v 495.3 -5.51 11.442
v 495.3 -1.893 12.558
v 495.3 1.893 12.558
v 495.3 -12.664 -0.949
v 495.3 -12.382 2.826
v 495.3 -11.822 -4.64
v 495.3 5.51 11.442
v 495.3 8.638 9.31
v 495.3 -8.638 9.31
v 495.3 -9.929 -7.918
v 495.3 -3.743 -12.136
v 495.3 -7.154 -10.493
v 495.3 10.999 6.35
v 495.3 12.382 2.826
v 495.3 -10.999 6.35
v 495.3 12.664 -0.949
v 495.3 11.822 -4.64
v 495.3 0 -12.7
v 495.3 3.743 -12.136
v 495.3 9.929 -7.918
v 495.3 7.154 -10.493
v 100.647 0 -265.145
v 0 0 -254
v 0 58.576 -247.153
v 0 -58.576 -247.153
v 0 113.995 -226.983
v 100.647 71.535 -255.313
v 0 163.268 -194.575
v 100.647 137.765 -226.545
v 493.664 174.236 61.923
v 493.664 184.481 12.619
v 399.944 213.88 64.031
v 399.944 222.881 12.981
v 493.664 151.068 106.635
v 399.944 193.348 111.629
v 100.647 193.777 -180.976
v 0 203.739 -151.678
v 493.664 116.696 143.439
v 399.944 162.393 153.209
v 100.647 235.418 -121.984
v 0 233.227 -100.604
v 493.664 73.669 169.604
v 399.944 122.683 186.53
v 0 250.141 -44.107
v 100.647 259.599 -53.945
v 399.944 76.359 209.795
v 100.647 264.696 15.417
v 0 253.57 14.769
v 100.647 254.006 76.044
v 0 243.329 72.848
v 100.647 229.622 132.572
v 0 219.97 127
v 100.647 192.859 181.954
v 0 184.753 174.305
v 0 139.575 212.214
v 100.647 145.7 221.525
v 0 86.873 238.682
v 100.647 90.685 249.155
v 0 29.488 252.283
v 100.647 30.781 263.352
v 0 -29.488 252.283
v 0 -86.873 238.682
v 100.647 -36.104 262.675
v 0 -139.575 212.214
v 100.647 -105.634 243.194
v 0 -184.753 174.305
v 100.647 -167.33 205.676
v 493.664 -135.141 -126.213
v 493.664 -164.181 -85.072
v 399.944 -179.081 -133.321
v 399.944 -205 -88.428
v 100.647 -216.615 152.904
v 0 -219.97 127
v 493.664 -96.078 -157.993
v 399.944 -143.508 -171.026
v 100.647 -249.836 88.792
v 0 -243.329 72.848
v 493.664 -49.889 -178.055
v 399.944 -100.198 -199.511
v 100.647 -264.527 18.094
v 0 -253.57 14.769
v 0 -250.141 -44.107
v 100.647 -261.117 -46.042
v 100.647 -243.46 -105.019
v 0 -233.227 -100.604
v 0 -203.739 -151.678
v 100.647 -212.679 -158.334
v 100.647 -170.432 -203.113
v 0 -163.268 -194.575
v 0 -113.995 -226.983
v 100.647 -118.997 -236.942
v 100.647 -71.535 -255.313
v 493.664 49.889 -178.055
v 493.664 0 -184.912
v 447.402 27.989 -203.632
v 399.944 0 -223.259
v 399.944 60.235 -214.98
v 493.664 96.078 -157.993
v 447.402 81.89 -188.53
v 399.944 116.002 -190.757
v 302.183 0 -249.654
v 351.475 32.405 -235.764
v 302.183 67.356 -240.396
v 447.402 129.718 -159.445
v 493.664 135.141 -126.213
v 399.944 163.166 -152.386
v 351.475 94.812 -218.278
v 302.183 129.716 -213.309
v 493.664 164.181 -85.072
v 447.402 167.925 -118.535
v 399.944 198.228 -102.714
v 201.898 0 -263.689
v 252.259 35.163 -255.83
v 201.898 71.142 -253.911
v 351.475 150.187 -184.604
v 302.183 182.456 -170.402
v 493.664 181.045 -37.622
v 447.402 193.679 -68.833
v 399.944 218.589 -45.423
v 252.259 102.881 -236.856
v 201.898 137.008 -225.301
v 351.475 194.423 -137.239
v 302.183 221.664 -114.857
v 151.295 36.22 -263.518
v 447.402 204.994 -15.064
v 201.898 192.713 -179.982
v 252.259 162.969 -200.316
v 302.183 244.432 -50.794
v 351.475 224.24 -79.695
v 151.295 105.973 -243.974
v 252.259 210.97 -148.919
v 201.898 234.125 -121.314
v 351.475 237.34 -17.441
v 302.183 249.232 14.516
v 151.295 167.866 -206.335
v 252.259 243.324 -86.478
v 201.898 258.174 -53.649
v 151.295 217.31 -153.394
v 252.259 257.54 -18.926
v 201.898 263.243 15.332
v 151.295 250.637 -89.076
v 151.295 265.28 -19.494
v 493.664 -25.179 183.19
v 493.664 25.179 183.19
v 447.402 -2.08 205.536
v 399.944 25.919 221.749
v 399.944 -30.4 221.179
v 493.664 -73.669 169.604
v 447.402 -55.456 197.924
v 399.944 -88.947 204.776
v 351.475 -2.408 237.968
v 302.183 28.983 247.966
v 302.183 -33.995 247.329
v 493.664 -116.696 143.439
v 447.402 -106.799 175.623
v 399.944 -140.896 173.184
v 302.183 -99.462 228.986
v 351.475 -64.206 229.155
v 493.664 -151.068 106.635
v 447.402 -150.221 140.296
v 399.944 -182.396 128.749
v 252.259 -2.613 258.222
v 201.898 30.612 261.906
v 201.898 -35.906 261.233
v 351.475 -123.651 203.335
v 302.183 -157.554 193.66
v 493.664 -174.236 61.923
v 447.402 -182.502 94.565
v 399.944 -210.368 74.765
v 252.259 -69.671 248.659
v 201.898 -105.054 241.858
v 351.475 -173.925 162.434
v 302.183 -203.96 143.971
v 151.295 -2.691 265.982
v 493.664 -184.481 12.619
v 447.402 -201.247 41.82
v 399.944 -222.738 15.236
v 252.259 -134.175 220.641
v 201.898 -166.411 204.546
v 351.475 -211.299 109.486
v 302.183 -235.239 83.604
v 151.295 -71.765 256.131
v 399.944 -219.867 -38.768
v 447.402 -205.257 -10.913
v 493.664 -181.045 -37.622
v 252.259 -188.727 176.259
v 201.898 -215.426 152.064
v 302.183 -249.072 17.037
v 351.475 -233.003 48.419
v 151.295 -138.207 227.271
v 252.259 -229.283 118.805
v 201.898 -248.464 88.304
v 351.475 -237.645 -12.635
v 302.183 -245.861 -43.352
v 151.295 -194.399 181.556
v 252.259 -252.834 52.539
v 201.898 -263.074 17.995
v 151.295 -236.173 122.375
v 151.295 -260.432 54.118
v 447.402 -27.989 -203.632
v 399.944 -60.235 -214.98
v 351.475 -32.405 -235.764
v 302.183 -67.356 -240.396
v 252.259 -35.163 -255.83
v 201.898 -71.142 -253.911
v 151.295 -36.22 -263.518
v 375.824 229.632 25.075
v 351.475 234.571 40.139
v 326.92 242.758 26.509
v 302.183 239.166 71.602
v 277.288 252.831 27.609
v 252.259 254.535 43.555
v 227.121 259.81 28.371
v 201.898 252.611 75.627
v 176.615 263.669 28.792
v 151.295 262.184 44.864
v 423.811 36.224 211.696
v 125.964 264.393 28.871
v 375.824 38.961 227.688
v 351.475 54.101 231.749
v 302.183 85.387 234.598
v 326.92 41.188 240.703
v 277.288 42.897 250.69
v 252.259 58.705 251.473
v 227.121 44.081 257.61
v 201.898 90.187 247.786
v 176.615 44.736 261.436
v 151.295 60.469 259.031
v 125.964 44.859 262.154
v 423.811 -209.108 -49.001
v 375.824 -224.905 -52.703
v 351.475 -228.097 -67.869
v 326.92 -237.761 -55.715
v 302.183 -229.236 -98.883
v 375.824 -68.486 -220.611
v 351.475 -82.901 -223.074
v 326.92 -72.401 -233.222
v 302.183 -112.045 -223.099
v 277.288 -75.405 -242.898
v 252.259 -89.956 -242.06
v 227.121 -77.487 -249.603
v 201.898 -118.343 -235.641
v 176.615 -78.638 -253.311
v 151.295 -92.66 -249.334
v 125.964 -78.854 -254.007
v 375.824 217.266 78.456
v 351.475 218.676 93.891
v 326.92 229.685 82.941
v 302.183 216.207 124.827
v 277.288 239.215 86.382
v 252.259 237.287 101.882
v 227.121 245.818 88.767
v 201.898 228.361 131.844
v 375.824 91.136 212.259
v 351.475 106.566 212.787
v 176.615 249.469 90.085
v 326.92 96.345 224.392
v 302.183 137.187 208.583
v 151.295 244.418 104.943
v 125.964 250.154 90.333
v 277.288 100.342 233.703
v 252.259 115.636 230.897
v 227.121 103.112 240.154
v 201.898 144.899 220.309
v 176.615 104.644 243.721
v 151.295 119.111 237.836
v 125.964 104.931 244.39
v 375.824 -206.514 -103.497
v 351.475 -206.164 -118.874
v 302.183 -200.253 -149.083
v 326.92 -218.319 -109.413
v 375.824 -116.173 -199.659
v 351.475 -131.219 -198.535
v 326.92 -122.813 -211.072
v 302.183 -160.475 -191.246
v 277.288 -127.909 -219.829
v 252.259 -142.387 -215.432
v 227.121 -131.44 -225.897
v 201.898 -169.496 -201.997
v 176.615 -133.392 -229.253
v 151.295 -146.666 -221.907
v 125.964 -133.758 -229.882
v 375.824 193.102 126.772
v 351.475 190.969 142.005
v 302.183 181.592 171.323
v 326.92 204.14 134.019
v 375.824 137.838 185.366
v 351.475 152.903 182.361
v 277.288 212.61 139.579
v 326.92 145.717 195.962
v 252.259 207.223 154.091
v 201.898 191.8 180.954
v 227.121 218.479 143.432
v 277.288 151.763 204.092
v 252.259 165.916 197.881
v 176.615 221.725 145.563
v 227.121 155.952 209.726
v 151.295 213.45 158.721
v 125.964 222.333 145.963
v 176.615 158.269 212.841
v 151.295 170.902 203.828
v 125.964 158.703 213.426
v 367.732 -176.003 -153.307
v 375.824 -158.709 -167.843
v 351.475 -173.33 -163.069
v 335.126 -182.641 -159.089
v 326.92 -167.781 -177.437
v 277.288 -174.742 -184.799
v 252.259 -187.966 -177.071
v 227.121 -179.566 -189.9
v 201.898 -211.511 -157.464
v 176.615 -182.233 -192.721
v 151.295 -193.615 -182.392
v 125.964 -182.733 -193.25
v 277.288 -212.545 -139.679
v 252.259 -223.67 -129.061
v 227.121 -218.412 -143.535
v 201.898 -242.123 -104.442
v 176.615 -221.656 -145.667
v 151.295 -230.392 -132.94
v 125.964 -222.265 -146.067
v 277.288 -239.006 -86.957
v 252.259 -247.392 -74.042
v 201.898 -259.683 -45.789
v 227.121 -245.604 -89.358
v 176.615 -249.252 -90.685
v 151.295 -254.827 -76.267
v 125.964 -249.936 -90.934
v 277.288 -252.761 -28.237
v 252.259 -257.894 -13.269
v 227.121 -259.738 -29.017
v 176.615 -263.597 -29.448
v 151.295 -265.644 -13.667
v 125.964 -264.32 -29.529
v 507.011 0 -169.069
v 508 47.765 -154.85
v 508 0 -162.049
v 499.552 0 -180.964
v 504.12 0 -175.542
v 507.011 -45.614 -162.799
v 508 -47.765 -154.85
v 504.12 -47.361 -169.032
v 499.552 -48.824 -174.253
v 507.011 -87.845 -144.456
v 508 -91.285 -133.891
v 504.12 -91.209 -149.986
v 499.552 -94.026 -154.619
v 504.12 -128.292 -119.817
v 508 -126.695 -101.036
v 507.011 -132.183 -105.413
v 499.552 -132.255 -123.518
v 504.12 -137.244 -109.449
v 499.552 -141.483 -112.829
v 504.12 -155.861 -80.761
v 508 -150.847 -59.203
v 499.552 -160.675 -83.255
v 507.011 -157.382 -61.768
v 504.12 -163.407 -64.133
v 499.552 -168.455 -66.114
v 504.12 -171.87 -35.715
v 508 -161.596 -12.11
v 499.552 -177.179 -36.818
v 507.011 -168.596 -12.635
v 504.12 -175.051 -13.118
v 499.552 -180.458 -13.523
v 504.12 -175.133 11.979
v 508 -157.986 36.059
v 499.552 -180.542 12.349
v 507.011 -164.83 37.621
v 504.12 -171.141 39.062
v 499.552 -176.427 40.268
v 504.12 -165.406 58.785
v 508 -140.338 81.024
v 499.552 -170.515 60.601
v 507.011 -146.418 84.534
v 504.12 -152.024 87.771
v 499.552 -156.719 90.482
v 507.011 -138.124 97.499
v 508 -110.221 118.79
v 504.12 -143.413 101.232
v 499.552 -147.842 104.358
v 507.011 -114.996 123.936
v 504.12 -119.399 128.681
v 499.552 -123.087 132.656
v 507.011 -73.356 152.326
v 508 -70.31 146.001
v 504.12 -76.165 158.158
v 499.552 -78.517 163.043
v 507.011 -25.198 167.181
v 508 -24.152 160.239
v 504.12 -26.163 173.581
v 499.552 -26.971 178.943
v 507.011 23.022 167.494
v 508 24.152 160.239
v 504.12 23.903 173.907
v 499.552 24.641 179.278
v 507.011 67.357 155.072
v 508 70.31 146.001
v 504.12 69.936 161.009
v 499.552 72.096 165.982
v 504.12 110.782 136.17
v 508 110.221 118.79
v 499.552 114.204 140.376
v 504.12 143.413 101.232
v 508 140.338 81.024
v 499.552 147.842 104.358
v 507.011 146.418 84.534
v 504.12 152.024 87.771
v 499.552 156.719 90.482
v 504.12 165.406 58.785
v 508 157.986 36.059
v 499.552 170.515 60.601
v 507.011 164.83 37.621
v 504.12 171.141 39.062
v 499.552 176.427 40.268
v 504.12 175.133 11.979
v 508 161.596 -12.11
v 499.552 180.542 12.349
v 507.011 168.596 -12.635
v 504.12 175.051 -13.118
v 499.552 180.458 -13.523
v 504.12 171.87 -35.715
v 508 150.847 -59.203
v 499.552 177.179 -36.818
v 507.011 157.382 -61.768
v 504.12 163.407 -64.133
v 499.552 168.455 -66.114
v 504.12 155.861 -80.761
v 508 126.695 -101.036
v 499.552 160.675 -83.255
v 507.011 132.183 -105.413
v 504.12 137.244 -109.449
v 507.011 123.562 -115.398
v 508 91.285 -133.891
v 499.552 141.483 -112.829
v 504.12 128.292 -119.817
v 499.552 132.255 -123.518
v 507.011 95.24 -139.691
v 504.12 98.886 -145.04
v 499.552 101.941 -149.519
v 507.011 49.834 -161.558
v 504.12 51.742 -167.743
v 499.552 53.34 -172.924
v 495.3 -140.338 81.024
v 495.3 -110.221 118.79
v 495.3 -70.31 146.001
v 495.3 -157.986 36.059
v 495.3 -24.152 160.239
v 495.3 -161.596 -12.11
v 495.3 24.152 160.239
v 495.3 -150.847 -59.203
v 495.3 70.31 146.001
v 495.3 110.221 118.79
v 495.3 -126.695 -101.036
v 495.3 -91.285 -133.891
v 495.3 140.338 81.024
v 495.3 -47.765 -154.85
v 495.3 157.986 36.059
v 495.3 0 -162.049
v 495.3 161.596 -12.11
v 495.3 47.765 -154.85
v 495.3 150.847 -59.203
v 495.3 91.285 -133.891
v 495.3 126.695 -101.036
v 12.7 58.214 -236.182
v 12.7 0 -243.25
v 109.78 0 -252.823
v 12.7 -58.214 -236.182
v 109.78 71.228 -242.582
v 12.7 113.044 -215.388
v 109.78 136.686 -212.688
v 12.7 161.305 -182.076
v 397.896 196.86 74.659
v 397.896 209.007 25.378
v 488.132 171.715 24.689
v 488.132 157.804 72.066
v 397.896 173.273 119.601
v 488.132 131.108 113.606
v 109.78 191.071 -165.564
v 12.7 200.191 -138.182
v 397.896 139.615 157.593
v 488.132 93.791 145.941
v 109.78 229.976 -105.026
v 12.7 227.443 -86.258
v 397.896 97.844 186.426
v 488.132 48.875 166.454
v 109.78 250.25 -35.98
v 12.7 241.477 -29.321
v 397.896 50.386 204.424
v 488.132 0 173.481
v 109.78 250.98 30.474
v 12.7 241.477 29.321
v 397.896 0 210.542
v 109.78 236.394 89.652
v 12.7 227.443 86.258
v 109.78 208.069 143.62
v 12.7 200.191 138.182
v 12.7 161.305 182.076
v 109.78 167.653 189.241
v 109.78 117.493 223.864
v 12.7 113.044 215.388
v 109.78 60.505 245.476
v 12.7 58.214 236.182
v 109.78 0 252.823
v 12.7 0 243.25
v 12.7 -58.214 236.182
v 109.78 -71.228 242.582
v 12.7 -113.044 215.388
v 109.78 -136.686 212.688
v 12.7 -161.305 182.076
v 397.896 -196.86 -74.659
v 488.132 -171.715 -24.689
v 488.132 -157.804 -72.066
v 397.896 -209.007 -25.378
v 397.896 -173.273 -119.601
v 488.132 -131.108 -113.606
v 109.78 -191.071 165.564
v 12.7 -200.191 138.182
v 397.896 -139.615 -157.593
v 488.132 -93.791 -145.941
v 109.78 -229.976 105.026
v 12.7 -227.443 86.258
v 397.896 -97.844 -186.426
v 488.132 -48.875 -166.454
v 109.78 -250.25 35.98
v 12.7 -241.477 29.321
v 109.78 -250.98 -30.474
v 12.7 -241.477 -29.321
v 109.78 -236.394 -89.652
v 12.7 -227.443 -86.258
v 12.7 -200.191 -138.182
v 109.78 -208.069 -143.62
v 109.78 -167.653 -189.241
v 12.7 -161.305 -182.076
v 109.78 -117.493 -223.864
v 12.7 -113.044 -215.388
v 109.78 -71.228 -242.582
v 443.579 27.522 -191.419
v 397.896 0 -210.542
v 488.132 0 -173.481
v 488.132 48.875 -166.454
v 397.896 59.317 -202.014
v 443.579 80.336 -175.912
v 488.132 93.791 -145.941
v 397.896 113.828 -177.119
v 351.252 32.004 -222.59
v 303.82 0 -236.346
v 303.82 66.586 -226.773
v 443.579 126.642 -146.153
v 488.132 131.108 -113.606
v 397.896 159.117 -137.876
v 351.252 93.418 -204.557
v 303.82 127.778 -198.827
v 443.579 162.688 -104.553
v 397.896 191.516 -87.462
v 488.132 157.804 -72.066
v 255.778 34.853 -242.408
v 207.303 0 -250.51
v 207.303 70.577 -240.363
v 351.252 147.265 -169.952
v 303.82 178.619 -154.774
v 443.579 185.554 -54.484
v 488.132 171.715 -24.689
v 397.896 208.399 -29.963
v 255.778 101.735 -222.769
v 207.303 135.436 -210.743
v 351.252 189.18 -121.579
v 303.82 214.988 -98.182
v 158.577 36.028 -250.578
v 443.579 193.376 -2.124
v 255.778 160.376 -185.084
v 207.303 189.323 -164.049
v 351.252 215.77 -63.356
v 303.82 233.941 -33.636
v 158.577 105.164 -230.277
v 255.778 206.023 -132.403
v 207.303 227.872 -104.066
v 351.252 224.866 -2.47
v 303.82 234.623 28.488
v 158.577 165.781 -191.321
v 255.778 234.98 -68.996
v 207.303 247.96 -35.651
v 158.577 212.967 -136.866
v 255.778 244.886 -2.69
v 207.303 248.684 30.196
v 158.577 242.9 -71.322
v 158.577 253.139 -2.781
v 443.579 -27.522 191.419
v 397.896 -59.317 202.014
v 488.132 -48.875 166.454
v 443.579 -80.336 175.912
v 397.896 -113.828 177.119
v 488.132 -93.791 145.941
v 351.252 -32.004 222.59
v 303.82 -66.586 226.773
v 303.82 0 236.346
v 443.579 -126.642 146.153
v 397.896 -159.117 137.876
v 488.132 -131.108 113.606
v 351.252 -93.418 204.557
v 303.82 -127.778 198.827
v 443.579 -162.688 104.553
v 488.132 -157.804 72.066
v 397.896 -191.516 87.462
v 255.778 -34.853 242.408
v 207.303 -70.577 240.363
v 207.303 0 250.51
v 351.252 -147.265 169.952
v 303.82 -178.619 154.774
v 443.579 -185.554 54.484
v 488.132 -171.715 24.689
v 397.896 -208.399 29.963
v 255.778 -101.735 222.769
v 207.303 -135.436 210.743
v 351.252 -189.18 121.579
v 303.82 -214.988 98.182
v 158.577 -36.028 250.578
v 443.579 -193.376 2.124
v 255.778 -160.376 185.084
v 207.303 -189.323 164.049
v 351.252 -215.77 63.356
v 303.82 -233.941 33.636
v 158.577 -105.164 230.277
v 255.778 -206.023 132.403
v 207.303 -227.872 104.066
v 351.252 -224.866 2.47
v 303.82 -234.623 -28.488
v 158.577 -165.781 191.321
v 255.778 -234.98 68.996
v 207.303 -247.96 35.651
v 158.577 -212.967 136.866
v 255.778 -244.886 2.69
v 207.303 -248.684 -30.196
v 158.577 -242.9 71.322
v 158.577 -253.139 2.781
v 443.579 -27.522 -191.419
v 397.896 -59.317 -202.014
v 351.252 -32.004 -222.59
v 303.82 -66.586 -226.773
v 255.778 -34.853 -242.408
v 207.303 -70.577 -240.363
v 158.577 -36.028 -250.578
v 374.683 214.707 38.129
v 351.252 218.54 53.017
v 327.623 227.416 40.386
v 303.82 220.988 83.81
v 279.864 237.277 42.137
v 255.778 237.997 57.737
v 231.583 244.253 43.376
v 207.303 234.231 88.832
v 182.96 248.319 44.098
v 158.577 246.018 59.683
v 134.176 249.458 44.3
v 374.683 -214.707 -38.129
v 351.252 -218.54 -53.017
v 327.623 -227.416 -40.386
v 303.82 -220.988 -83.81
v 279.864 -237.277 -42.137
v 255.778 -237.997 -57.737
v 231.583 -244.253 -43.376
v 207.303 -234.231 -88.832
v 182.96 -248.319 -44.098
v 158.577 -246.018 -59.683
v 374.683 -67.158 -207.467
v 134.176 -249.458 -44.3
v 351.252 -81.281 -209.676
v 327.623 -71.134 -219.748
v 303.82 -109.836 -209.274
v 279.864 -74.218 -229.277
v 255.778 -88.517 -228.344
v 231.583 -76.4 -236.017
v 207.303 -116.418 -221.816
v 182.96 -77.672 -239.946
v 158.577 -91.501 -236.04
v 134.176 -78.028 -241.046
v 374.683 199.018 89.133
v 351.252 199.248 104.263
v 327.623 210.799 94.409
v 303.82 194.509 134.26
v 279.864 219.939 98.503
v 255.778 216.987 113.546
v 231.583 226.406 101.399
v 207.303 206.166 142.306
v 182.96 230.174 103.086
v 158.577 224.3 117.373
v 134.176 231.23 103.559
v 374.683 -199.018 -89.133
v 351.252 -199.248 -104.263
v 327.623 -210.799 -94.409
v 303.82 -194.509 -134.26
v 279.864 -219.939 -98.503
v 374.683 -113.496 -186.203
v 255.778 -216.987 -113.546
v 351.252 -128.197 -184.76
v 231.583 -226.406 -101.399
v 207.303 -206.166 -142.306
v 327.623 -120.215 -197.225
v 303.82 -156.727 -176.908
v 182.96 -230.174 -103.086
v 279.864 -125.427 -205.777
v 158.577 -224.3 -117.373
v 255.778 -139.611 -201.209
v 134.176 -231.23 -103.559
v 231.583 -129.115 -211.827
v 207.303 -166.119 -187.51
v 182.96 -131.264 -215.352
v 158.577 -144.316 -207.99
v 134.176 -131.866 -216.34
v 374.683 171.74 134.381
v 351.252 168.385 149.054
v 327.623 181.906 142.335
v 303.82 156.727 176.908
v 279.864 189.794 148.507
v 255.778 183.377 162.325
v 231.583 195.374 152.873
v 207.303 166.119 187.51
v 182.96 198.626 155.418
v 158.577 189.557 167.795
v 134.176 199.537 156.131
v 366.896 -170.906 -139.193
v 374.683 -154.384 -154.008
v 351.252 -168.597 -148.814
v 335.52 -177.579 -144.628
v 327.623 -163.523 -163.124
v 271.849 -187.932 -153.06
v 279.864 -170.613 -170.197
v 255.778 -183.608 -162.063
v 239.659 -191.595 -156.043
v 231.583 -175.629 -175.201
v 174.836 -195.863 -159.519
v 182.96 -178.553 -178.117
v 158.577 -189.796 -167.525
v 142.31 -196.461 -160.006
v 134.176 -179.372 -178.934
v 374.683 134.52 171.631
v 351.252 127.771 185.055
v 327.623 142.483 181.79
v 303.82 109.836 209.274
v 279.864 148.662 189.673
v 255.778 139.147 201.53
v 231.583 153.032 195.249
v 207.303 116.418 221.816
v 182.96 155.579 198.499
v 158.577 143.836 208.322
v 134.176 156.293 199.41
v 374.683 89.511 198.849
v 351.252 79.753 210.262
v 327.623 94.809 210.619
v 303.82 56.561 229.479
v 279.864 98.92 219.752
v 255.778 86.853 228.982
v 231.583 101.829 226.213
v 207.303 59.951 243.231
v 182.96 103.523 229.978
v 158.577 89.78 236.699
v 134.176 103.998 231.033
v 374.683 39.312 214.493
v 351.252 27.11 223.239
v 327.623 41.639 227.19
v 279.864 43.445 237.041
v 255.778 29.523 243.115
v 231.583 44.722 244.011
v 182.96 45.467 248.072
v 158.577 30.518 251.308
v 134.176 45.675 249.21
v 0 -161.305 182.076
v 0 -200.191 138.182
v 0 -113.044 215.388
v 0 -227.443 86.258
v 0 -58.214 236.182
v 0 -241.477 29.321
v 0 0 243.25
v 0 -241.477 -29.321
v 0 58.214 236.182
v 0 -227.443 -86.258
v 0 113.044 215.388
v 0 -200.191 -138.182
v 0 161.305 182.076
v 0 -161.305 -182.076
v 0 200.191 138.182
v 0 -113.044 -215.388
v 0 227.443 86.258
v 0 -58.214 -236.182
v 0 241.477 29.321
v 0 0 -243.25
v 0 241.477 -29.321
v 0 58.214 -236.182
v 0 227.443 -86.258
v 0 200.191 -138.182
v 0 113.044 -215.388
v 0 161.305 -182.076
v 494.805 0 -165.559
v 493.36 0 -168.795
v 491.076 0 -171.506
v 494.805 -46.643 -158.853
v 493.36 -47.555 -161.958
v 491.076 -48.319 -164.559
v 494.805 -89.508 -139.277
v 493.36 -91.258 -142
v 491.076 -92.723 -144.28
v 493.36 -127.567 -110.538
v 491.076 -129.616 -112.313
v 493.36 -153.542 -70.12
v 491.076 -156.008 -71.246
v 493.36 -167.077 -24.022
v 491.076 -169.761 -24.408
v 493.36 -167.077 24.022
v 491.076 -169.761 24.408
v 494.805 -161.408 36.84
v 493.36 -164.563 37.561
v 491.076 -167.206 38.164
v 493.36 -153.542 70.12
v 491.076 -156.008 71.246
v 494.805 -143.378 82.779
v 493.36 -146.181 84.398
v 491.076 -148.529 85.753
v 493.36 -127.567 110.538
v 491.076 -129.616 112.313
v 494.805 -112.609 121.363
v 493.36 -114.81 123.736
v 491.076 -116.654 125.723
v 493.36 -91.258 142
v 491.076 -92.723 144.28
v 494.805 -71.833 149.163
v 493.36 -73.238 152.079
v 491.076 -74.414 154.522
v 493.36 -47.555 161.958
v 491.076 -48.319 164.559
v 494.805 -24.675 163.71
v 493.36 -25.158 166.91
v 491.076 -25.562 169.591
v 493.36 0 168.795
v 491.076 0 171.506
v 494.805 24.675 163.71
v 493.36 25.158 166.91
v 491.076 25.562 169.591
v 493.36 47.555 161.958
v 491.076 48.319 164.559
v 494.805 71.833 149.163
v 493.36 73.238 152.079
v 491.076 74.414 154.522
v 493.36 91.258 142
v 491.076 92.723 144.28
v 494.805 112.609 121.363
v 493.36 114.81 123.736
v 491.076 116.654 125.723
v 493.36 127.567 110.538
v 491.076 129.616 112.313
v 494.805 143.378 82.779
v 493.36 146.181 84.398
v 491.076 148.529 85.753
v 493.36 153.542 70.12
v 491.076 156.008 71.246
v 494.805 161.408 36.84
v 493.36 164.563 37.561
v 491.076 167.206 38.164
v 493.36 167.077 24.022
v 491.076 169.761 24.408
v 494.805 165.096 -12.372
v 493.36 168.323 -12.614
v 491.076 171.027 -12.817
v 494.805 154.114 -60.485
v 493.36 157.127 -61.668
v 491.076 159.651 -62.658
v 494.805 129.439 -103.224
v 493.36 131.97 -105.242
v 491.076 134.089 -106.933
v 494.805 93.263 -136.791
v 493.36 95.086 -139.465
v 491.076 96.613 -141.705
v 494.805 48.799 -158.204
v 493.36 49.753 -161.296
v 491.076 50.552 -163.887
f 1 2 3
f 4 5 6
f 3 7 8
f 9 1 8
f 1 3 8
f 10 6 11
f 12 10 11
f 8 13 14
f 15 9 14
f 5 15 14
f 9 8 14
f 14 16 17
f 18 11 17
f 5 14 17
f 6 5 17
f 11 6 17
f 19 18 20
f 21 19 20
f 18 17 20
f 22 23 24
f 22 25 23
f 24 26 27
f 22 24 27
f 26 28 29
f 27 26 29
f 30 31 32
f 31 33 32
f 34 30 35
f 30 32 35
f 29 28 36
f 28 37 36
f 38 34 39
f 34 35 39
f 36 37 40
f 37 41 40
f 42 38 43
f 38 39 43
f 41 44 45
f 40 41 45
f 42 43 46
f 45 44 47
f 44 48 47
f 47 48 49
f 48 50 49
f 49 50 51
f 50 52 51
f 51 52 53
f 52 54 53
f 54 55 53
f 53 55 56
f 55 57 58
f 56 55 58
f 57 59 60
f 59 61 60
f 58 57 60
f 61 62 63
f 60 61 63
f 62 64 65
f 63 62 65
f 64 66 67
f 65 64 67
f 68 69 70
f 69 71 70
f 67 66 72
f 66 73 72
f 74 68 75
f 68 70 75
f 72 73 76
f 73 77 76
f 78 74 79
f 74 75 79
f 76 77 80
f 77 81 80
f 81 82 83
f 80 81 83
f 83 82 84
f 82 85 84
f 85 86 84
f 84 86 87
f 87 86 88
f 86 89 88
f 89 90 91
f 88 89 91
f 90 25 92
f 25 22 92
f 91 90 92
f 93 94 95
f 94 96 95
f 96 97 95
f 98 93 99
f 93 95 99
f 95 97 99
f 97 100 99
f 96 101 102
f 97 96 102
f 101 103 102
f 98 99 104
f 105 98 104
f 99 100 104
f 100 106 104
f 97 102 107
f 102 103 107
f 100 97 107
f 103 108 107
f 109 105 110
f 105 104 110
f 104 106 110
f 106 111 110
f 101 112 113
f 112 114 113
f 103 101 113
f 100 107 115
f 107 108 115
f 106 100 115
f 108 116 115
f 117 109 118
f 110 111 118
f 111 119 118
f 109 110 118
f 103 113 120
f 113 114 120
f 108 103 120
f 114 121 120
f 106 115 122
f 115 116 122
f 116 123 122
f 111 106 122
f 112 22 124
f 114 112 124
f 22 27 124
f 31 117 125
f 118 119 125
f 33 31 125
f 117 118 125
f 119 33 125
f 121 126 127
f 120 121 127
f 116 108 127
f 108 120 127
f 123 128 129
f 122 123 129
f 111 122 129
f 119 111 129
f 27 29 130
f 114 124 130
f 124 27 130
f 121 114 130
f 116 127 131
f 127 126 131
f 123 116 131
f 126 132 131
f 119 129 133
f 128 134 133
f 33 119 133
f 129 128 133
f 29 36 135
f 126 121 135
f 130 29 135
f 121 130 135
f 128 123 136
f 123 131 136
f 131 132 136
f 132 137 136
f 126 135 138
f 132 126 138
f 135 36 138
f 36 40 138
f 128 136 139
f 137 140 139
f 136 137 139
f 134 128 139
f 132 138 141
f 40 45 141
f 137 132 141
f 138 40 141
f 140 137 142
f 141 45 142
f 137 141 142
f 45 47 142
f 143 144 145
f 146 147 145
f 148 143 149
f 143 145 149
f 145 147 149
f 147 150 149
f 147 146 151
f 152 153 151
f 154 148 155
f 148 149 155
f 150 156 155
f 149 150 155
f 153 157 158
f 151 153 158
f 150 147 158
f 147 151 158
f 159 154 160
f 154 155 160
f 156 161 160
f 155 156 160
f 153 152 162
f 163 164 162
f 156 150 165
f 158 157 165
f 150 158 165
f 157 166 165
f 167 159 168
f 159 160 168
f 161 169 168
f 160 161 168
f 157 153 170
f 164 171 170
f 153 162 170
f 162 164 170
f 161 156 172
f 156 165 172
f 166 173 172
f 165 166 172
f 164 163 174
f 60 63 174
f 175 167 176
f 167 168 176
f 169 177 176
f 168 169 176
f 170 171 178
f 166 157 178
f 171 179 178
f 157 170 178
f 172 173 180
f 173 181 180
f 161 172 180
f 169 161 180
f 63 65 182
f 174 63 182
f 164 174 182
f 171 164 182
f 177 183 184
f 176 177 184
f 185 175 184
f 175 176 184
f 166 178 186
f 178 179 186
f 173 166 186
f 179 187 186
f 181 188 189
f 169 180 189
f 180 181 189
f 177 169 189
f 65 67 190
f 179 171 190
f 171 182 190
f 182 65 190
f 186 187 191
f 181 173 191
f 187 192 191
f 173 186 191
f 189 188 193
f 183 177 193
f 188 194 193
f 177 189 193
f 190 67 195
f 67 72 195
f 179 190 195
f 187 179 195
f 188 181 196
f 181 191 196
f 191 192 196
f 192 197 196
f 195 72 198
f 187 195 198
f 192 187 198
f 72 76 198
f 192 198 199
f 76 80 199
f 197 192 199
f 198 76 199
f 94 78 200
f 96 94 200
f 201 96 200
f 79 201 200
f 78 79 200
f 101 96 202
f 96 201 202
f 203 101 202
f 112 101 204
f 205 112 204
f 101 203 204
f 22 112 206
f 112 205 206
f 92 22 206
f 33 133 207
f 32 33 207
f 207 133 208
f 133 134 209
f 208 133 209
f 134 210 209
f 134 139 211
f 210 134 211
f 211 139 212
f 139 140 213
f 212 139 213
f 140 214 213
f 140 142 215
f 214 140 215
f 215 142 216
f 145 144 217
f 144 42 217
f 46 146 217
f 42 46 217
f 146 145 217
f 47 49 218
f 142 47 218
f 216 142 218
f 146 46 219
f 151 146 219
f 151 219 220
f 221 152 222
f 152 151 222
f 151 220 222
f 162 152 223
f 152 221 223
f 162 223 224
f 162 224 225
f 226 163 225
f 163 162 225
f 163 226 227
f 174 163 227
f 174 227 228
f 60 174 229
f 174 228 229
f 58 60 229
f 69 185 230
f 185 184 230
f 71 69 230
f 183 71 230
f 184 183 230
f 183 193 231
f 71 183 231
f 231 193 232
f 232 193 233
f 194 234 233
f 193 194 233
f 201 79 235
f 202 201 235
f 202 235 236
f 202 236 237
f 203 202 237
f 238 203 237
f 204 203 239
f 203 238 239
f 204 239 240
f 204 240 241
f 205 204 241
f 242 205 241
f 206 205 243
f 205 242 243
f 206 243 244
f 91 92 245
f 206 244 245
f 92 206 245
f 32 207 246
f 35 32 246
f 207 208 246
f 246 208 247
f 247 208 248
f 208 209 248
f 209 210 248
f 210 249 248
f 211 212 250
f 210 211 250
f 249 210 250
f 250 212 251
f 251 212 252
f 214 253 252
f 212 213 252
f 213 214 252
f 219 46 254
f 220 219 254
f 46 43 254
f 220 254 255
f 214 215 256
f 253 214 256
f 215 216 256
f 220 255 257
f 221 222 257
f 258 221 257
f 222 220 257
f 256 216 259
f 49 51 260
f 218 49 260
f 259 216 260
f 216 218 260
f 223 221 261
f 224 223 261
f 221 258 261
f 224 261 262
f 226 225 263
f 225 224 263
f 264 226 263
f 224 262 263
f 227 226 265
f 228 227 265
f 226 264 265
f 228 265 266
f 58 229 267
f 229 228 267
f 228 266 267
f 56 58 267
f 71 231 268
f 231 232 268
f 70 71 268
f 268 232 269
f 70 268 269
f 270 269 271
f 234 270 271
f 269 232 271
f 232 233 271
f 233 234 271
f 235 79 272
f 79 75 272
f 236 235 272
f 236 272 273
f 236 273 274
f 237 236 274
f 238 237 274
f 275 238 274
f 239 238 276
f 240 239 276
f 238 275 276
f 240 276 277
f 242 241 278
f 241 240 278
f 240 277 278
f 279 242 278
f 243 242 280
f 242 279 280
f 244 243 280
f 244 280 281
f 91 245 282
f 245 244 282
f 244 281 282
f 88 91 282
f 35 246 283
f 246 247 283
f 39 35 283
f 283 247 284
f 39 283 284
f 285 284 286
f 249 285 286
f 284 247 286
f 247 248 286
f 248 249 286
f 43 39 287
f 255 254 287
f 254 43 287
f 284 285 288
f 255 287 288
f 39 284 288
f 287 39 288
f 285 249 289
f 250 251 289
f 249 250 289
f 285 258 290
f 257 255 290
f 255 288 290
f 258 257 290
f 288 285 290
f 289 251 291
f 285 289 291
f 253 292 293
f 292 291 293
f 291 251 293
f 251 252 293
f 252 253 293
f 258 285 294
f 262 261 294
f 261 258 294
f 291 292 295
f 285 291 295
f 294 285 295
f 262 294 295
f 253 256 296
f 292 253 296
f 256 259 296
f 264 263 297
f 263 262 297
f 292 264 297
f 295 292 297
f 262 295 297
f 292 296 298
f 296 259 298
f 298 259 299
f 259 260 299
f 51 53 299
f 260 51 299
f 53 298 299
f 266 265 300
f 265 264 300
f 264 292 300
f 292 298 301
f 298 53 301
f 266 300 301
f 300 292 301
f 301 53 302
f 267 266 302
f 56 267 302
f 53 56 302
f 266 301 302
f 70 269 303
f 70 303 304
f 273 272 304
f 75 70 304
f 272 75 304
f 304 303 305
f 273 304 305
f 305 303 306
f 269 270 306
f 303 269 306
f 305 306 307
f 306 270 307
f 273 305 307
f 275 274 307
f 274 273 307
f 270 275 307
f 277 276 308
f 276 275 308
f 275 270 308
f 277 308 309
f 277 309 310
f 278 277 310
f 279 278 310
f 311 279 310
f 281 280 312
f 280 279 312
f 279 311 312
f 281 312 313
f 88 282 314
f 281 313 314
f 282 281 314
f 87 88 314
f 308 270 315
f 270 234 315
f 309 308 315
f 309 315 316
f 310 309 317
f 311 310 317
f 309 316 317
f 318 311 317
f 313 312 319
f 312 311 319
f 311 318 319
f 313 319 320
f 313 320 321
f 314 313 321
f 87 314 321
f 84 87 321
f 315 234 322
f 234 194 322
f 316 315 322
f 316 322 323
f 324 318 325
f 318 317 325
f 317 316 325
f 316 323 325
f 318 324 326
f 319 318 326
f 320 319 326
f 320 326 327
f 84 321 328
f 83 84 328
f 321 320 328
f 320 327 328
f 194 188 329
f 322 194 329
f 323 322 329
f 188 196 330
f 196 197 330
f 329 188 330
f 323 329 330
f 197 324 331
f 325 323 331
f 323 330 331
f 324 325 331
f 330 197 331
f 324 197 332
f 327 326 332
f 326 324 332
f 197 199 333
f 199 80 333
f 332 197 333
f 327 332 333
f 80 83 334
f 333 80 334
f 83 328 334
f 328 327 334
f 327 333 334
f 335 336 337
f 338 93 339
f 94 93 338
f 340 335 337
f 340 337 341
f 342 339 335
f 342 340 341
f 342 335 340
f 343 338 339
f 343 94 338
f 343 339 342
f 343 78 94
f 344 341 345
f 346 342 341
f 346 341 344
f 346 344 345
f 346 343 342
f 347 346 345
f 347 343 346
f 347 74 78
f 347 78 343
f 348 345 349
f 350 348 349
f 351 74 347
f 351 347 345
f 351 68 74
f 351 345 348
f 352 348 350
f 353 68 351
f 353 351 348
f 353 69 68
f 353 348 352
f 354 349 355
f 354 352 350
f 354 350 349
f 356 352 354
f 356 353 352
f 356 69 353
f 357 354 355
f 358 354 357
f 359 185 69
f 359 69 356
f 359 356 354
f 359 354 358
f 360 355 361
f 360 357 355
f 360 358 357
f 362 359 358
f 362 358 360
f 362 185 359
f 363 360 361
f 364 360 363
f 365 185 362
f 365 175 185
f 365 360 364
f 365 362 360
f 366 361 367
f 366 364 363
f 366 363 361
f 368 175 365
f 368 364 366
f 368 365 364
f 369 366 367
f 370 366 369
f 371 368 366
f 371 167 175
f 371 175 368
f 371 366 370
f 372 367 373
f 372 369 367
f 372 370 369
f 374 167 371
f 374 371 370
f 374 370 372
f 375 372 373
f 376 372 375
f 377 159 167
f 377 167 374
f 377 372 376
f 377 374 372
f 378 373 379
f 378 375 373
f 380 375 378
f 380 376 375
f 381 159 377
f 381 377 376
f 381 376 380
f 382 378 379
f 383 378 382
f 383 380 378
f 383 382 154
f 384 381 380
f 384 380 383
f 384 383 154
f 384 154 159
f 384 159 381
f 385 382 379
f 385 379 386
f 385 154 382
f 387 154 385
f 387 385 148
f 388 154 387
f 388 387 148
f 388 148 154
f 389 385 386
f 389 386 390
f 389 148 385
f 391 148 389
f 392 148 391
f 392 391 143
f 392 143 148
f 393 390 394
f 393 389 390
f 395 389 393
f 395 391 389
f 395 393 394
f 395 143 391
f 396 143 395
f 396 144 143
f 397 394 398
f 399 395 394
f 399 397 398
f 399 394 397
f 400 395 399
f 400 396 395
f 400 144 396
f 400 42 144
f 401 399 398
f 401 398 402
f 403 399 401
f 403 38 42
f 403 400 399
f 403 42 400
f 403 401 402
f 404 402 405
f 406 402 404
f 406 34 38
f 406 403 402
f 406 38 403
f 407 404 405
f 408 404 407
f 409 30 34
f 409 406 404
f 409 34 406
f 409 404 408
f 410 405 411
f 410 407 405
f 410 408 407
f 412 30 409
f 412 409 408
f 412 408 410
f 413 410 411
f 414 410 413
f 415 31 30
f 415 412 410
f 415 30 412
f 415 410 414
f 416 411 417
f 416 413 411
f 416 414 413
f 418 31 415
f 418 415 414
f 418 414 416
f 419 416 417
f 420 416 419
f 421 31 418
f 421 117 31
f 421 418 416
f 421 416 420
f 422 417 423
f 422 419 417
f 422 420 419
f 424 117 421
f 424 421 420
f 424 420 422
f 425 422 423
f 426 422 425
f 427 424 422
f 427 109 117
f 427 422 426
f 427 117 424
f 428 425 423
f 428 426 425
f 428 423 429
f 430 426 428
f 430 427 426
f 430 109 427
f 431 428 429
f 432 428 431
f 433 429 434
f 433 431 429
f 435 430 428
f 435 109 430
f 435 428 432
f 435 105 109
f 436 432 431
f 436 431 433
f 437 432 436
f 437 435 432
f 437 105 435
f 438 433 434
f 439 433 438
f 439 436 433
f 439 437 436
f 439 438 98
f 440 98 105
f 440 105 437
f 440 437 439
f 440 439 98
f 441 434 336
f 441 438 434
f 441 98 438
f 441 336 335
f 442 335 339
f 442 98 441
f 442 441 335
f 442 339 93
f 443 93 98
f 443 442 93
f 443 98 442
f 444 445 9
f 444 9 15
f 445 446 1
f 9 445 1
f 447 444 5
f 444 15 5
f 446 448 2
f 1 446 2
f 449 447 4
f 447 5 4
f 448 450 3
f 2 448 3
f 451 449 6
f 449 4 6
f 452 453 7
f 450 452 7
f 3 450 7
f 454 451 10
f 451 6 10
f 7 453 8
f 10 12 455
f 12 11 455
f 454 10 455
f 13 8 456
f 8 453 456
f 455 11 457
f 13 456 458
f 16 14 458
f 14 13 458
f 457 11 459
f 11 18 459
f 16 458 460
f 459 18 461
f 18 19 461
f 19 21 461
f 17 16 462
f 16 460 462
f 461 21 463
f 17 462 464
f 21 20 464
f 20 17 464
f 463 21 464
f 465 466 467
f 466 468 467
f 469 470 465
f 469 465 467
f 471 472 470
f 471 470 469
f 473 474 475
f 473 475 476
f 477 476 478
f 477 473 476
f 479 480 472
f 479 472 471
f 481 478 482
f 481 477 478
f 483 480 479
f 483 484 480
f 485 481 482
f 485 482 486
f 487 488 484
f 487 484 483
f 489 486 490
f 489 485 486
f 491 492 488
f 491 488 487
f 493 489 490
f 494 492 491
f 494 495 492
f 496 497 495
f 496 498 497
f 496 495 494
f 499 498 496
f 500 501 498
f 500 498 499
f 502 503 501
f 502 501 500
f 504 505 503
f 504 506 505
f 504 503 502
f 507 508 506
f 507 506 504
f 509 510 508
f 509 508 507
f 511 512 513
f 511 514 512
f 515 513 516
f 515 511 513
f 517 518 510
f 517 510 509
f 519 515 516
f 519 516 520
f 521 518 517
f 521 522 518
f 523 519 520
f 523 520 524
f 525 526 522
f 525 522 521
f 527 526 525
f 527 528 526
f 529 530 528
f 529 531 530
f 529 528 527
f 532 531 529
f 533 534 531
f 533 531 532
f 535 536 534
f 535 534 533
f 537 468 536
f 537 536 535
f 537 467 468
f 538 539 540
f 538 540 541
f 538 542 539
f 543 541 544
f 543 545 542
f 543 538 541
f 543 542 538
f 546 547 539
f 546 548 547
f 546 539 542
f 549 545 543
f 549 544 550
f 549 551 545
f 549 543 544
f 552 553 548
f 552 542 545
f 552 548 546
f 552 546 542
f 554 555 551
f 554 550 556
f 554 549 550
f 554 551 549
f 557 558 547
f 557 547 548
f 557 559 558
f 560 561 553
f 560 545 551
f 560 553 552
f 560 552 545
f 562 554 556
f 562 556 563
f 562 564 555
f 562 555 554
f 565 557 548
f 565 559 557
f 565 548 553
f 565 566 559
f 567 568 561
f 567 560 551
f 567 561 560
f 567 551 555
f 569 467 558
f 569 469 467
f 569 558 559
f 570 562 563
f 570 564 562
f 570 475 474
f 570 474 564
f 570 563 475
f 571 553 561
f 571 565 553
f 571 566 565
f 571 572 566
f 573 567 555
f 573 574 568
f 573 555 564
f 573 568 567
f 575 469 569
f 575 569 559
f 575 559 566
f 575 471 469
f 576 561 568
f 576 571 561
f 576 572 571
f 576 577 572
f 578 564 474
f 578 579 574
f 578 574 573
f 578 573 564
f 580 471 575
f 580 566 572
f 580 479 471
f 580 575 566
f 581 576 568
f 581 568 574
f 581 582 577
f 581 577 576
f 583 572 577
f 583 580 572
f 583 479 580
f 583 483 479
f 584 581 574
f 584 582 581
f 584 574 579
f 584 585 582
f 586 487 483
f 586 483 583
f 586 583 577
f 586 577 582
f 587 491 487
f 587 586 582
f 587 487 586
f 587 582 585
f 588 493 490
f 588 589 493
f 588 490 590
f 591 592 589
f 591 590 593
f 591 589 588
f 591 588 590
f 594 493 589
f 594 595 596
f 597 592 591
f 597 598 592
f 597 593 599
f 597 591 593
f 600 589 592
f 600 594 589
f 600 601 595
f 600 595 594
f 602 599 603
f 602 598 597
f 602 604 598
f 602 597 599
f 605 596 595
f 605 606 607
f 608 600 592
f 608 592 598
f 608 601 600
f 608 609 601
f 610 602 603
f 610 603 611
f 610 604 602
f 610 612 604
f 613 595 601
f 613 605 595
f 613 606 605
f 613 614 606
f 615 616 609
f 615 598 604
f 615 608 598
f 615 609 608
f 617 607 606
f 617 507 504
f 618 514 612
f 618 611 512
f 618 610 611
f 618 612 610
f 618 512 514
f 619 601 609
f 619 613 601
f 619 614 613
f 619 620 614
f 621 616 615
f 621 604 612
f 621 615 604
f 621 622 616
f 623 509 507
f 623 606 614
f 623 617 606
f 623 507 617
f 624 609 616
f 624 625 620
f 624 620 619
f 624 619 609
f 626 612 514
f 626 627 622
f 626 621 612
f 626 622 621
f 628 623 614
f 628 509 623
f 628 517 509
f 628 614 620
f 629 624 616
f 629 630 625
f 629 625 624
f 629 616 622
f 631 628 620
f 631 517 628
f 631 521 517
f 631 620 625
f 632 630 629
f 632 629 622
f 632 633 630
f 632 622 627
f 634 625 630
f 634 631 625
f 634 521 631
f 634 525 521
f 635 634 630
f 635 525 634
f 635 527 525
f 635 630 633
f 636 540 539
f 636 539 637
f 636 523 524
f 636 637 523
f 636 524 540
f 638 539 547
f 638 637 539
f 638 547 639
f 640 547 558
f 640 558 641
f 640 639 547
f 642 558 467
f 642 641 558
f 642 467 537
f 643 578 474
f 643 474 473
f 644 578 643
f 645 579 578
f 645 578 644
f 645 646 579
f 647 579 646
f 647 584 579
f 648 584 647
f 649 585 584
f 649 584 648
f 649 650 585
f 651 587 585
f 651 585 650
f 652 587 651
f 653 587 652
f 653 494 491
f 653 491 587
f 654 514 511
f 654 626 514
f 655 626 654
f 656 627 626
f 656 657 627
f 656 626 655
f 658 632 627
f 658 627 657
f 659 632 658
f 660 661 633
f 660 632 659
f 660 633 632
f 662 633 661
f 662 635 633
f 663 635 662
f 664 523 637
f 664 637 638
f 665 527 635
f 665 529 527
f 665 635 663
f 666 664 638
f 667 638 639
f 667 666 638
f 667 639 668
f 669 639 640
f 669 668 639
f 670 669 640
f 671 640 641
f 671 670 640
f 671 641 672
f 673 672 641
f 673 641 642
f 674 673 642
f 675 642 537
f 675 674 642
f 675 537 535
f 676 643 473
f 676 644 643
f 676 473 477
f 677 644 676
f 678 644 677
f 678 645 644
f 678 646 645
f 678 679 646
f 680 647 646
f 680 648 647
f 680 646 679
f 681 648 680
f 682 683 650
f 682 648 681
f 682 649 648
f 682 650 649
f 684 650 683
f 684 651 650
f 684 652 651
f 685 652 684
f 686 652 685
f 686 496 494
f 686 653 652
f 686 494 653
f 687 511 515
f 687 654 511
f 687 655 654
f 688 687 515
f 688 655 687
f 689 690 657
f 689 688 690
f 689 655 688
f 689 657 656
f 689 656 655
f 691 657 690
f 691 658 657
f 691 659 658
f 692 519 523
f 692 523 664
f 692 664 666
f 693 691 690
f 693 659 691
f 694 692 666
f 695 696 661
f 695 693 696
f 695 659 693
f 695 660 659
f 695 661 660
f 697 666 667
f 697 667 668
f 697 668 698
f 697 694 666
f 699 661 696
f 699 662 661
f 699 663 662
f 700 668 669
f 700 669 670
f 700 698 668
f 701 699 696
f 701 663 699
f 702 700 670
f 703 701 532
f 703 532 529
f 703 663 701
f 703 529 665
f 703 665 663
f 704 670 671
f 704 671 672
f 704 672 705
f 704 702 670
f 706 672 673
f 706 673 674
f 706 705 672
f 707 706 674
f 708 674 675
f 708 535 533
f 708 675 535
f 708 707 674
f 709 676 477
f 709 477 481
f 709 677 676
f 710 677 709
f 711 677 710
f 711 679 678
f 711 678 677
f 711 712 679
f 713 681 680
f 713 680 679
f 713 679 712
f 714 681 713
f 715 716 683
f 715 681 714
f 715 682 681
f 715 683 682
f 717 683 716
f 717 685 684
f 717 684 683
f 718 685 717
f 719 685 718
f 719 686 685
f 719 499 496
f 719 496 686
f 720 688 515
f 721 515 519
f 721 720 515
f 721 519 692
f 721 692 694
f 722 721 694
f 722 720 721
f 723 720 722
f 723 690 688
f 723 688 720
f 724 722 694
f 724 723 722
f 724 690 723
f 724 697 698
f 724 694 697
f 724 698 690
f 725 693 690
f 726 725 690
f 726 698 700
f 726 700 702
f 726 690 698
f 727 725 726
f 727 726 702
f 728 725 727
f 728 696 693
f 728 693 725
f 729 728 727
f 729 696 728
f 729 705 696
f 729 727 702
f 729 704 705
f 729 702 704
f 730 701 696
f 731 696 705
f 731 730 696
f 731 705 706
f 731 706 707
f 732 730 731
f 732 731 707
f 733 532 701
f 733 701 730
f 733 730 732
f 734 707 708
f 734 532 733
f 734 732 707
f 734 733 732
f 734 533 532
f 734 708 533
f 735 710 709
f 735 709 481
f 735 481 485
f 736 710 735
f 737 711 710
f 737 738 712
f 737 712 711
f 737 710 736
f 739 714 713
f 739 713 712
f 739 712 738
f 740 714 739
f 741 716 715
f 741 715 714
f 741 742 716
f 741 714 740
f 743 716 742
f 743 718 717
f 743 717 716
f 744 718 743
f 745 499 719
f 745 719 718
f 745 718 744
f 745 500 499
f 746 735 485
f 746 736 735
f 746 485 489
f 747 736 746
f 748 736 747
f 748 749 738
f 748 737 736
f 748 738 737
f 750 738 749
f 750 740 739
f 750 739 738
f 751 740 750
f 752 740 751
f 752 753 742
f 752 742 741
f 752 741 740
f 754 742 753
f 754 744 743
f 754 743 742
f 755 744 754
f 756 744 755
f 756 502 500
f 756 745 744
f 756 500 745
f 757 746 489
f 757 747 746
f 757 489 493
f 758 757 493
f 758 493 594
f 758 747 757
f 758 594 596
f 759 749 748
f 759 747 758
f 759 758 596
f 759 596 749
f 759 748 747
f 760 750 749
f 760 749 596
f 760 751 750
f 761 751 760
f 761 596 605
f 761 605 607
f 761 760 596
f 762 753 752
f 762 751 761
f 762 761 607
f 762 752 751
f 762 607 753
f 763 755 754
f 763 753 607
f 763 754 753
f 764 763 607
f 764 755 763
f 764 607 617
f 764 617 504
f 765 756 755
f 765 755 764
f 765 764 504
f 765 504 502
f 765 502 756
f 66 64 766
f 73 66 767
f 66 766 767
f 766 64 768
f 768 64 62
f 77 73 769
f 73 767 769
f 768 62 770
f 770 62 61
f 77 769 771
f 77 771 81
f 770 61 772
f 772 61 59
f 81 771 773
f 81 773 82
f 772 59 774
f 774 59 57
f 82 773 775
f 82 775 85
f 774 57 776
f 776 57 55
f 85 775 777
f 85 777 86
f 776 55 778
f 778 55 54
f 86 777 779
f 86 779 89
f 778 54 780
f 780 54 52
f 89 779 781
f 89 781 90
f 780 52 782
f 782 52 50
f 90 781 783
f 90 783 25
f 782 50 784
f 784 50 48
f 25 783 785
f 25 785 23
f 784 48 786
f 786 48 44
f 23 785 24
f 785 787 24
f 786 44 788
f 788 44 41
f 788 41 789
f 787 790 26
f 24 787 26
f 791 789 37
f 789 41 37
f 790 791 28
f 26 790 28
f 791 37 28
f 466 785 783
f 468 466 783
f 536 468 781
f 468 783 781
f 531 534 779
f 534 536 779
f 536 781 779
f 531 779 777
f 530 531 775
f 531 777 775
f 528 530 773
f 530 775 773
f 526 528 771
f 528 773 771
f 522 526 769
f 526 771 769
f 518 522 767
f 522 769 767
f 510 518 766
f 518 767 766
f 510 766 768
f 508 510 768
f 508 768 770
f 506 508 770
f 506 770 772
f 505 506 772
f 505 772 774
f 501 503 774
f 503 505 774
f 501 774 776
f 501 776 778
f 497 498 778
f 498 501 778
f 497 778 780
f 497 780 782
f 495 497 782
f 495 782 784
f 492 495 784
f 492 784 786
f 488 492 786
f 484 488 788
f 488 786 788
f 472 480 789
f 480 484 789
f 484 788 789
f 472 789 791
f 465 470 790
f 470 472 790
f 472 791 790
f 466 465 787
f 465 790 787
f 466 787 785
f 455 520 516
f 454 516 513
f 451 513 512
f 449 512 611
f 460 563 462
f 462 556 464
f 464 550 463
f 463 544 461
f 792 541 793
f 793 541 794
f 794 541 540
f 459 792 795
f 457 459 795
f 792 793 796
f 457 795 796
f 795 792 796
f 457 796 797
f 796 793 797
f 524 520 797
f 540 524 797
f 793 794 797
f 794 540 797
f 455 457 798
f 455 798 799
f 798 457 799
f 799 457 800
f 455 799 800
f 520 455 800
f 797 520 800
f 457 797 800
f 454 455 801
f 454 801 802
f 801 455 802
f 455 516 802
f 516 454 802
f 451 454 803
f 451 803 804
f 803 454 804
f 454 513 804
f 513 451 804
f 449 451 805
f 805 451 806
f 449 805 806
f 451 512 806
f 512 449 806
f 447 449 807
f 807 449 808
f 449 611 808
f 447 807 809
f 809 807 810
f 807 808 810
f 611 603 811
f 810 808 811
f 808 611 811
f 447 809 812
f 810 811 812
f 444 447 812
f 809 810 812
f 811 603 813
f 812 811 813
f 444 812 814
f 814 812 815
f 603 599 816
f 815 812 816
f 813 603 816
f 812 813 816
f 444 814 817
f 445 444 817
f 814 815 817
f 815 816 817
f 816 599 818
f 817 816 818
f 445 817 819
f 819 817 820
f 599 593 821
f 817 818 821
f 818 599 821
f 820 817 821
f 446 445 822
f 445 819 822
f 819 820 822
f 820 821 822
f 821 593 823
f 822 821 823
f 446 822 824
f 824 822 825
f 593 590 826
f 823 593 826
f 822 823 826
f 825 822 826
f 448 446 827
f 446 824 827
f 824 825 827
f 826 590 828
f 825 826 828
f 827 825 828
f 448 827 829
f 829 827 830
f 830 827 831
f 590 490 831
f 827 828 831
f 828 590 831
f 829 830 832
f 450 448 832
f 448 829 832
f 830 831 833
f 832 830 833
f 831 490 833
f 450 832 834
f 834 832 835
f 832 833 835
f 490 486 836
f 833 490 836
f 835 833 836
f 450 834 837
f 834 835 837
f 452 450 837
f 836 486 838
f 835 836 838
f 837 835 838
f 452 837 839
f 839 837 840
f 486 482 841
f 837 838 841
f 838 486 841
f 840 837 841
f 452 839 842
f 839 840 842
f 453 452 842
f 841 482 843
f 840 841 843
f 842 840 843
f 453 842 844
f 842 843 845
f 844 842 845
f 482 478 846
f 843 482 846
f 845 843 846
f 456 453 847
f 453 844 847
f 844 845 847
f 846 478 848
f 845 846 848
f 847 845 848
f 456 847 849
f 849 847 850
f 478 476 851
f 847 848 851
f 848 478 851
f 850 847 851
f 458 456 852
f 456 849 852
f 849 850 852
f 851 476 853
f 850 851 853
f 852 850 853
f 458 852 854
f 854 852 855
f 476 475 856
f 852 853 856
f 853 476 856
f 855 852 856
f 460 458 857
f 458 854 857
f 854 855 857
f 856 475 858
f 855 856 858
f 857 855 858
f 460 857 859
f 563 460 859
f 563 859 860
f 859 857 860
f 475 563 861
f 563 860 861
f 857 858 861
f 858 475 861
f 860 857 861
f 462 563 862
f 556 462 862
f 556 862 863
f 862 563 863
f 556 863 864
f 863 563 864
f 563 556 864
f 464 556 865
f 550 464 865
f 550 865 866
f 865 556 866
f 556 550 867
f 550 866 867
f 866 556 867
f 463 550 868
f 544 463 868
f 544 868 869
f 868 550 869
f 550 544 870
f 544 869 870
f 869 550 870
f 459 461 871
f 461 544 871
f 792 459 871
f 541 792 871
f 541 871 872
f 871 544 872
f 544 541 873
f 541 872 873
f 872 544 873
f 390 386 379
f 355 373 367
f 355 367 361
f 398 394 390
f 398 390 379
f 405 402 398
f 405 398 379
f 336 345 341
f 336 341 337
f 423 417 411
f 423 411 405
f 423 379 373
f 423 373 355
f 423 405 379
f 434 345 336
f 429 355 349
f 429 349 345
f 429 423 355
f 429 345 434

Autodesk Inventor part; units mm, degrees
ref_plane "YZ Plane" through (0, 0, 0) normal (1, 0, 0) x (0, 1, 0)
ref_plane "XZ Plane" through (0, 0, 0) normal (0, 1, 0) x (-1, 0, 0)
ref_plane "XY Plane" through (0, 0, 0) normal (0, 0, 1) x (1, 0, 0)
sketch "Sketch1" plane through (0, 0, 0) normal (0, 1, 0) x (-1, 0, 0)
  line L0 (0, 0) -> (0, -254)
  line L1 (0, 0) -> (-508, 0)
  line L2 (-508, 0) -> (-508, -162.0489)
  arc A0 (-493.6643, -184.9125) -> (0, -254) centre (-139.6069, 546.7208) ccw
  arc A1 (-508, -162.0489) -> (-493.6643, -184.9125) centre (-482.6, -162.0489) ccw
  line L3 (-495.3, -12.7) -> (-495.3, -162.0489)
  arc A2 (-495.3, -162.0489) -> (-488.1321, -173.4807) centre (-482.6, -162.0489) ccw
  arc A3 (-488.1321, -173.4807) -> (-12.7, -243.2505) centre (-139.6069, 546.7208) ccw
  line L4 (-495.3, -12.7) -> (-495.3, 0)
  line L5 (-12.7, -243.2505) -> (0, -243.2505)
  point P0 (-508, -177.8)
  dimension "d0" = 254
  dimension "d1" = 508
  dimension "d2" = 177.8
  dimension "d3" = 25.4
  dimension "d4" = 812.8
  dimension "d5" = 12.7
  dimension "d6" = 12.7
revolve "Revolution1" add sketch "Sketch1" angle 360 about axis through (0, 0, 0) along (1, 0, 0) contours L0 A0 A1 L2 L1 L4 L3 A2 A3 L5
properties part number "Bucket" material "LCP Plastic"
